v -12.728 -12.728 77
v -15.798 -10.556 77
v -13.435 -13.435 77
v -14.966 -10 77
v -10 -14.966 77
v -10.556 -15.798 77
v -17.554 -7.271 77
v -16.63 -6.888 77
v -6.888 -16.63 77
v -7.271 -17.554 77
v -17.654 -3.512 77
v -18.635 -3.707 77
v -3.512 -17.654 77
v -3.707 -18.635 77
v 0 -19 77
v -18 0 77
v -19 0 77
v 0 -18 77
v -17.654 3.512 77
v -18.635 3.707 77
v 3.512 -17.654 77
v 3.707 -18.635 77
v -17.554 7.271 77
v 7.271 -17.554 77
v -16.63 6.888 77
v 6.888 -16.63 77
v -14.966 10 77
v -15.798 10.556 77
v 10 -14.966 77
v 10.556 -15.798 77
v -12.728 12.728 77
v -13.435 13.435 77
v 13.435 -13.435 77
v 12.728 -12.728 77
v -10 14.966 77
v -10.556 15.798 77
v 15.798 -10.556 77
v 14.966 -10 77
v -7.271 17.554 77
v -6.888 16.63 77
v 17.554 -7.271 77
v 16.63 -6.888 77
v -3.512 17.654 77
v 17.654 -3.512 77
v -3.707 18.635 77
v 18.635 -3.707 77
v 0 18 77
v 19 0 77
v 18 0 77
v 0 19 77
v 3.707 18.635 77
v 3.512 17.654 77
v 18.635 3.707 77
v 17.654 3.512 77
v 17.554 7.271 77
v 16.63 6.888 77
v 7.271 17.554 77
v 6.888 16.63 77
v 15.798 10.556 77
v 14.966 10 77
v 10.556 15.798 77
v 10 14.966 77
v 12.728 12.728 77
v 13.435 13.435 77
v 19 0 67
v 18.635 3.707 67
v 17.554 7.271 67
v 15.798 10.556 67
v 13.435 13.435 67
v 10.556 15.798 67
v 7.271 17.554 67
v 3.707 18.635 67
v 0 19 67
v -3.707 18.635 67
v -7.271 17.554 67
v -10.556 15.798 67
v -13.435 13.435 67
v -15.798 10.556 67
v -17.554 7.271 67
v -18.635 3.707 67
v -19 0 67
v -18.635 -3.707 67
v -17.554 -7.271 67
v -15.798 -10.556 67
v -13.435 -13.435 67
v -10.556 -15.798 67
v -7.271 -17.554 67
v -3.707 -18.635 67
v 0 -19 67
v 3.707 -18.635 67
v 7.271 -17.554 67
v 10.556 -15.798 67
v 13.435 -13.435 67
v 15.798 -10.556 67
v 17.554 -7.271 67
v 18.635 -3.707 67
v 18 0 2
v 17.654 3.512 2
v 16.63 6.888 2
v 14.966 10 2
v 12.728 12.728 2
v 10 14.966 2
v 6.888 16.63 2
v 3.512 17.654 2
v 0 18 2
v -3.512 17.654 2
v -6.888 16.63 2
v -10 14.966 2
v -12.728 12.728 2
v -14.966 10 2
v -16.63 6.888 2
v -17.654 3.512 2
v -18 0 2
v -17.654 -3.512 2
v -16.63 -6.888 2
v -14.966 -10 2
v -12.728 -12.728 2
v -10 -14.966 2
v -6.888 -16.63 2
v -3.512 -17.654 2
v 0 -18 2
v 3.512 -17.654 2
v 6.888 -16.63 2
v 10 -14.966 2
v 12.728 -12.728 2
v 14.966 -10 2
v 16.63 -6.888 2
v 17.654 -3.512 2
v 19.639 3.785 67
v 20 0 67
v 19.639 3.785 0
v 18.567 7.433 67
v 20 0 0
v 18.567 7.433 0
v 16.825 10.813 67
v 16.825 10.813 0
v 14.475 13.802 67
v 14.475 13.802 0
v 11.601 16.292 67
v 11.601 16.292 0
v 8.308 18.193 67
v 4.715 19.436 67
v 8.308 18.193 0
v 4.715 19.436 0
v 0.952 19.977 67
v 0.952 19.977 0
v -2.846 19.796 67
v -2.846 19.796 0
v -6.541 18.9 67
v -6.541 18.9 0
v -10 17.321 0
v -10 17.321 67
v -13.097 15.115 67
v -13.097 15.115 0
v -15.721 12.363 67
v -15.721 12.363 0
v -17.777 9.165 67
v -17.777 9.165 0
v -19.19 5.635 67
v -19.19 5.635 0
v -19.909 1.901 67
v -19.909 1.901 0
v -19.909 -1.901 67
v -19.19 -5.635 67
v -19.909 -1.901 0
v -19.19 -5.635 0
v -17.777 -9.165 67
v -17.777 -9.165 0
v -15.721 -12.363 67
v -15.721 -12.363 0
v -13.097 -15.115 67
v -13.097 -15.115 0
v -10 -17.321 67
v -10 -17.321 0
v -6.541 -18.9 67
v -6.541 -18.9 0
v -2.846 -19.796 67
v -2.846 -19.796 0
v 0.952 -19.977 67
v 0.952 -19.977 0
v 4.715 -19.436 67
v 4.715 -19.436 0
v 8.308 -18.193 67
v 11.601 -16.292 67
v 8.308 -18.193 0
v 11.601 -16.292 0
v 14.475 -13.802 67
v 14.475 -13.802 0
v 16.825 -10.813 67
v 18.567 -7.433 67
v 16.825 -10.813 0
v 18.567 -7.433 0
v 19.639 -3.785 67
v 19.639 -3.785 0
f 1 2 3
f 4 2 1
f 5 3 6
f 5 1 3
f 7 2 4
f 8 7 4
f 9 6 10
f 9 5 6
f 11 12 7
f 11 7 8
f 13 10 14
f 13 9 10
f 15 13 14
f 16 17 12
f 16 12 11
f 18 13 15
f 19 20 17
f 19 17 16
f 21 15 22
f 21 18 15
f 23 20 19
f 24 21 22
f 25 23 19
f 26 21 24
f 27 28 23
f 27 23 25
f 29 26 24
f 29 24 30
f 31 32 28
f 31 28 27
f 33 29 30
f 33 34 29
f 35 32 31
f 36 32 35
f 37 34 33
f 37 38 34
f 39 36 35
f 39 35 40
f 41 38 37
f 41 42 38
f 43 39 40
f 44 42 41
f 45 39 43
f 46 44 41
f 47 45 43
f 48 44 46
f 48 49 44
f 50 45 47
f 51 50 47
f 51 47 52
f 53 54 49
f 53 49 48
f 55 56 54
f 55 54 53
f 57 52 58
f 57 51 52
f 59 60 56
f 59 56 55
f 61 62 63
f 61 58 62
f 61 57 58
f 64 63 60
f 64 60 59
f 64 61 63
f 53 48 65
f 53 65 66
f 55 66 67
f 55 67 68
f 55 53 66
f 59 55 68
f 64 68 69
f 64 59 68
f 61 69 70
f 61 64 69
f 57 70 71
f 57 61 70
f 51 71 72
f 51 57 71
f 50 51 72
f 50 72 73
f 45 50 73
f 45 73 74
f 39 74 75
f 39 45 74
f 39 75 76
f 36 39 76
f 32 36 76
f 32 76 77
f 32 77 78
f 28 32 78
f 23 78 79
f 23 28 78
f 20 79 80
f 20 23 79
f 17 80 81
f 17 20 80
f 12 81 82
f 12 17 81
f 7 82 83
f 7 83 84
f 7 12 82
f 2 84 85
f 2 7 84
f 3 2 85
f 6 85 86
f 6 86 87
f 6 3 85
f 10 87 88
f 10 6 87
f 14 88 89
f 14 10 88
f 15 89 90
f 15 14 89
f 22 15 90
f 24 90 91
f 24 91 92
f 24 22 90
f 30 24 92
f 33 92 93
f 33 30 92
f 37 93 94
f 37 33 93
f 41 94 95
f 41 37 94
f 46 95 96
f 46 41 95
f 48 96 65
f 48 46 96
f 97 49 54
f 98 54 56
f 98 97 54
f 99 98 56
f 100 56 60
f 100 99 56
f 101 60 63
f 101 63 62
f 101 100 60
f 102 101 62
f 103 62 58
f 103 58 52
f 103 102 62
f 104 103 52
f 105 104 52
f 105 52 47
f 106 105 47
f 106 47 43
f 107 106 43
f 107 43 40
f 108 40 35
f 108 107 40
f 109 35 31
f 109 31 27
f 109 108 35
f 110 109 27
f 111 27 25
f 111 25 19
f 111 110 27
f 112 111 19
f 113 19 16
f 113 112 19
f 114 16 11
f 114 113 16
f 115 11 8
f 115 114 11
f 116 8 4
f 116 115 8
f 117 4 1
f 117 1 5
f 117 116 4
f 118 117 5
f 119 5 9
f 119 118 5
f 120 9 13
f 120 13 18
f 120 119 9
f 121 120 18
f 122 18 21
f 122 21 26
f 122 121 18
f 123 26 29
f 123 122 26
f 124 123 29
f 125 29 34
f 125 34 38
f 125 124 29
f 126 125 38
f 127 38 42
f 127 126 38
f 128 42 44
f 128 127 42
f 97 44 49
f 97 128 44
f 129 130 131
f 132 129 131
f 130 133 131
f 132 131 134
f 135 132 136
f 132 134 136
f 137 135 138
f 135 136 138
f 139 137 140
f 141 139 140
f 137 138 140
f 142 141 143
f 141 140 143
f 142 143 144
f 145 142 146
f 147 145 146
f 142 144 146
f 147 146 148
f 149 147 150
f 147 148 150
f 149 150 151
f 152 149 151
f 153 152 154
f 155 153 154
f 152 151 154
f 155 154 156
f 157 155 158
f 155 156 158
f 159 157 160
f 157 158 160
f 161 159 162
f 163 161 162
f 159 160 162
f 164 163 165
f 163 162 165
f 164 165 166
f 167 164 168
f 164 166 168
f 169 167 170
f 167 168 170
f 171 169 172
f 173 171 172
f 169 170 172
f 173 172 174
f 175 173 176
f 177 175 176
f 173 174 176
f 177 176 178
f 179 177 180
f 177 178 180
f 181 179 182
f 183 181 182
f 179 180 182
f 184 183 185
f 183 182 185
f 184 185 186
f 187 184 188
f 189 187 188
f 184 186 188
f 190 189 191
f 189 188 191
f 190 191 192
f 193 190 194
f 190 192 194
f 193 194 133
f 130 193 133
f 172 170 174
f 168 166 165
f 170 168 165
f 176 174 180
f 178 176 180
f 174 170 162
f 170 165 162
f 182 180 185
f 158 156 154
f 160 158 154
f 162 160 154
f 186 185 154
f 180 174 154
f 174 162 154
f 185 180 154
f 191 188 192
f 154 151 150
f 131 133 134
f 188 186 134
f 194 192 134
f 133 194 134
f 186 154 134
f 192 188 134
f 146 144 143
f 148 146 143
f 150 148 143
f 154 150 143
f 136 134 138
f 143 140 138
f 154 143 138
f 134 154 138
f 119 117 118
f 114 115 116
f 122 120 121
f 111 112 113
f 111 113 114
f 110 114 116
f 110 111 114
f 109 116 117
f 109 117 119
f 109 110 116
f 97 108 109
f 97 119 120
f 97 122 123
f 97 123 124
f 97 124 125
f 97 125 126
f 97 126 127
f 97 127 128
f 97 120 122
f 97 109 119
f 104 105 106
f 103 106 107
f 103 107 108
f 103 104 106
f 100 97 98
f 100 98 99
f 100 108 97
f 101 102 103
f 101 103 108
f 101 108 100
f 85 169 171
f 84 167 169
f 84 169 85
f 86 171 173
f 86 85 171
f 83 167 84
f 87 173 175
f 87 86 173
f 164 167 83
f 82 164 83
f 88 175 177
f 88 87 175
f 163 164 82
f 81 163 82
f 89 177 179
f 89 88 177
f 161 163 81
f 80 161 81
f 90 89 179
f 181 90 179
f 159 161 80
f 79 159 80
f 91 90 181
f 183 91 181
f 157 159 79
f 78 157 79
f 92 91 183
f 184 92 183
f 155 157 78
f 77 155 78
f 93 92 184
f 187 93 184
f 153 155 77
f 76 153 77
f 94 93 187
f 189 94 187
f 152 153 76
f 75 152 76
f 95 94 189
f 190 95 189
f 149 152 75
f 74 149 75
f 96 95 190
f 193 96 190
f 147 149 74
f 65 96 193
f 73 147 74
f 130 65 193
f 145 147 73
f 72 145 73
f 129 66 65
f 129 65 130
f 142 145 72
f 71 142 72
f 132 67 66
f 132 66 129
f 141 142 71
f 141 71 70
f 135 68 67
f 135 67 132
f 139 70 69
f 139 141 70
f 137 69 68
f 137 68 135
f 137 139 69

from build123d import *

# Parameters (mm, degrees)
F0_R     = 20
F1_DEPTH = 2
F2_R     = 20
F2_R_2   = 18
F3_DEPTH = 75
F4_R     = 20
F4_R_2   = 19
F5_DEPTH = 10


with BuildPart() as f1:
    # F0 (on Top) → F1 (new body)
    with BuildSketch(Plane.XY):
        Circle(F0_R)
    extrude(amount=F1_DEPTH)

    # F2 (on face) → F3 (join)
    with BuildSketch(Plane.XY.offset(2)):
        Circle(F2_R)
        Circle(F2_R_2, mode=Mode.SUBTRACT)
    extrude(amount=F3_DEPTH)

    # F4 (on face) → F5 (cut)
    with BuildSketch(Plane.XY.offset(77)):
        Circle(F4_R)
        Circle(F4_R_2, mode=Mode.SUBTRACT)
    extrude(amount=-F5_DEPTH, mode=Mode.SUBTRACT)


solid = f1.part
